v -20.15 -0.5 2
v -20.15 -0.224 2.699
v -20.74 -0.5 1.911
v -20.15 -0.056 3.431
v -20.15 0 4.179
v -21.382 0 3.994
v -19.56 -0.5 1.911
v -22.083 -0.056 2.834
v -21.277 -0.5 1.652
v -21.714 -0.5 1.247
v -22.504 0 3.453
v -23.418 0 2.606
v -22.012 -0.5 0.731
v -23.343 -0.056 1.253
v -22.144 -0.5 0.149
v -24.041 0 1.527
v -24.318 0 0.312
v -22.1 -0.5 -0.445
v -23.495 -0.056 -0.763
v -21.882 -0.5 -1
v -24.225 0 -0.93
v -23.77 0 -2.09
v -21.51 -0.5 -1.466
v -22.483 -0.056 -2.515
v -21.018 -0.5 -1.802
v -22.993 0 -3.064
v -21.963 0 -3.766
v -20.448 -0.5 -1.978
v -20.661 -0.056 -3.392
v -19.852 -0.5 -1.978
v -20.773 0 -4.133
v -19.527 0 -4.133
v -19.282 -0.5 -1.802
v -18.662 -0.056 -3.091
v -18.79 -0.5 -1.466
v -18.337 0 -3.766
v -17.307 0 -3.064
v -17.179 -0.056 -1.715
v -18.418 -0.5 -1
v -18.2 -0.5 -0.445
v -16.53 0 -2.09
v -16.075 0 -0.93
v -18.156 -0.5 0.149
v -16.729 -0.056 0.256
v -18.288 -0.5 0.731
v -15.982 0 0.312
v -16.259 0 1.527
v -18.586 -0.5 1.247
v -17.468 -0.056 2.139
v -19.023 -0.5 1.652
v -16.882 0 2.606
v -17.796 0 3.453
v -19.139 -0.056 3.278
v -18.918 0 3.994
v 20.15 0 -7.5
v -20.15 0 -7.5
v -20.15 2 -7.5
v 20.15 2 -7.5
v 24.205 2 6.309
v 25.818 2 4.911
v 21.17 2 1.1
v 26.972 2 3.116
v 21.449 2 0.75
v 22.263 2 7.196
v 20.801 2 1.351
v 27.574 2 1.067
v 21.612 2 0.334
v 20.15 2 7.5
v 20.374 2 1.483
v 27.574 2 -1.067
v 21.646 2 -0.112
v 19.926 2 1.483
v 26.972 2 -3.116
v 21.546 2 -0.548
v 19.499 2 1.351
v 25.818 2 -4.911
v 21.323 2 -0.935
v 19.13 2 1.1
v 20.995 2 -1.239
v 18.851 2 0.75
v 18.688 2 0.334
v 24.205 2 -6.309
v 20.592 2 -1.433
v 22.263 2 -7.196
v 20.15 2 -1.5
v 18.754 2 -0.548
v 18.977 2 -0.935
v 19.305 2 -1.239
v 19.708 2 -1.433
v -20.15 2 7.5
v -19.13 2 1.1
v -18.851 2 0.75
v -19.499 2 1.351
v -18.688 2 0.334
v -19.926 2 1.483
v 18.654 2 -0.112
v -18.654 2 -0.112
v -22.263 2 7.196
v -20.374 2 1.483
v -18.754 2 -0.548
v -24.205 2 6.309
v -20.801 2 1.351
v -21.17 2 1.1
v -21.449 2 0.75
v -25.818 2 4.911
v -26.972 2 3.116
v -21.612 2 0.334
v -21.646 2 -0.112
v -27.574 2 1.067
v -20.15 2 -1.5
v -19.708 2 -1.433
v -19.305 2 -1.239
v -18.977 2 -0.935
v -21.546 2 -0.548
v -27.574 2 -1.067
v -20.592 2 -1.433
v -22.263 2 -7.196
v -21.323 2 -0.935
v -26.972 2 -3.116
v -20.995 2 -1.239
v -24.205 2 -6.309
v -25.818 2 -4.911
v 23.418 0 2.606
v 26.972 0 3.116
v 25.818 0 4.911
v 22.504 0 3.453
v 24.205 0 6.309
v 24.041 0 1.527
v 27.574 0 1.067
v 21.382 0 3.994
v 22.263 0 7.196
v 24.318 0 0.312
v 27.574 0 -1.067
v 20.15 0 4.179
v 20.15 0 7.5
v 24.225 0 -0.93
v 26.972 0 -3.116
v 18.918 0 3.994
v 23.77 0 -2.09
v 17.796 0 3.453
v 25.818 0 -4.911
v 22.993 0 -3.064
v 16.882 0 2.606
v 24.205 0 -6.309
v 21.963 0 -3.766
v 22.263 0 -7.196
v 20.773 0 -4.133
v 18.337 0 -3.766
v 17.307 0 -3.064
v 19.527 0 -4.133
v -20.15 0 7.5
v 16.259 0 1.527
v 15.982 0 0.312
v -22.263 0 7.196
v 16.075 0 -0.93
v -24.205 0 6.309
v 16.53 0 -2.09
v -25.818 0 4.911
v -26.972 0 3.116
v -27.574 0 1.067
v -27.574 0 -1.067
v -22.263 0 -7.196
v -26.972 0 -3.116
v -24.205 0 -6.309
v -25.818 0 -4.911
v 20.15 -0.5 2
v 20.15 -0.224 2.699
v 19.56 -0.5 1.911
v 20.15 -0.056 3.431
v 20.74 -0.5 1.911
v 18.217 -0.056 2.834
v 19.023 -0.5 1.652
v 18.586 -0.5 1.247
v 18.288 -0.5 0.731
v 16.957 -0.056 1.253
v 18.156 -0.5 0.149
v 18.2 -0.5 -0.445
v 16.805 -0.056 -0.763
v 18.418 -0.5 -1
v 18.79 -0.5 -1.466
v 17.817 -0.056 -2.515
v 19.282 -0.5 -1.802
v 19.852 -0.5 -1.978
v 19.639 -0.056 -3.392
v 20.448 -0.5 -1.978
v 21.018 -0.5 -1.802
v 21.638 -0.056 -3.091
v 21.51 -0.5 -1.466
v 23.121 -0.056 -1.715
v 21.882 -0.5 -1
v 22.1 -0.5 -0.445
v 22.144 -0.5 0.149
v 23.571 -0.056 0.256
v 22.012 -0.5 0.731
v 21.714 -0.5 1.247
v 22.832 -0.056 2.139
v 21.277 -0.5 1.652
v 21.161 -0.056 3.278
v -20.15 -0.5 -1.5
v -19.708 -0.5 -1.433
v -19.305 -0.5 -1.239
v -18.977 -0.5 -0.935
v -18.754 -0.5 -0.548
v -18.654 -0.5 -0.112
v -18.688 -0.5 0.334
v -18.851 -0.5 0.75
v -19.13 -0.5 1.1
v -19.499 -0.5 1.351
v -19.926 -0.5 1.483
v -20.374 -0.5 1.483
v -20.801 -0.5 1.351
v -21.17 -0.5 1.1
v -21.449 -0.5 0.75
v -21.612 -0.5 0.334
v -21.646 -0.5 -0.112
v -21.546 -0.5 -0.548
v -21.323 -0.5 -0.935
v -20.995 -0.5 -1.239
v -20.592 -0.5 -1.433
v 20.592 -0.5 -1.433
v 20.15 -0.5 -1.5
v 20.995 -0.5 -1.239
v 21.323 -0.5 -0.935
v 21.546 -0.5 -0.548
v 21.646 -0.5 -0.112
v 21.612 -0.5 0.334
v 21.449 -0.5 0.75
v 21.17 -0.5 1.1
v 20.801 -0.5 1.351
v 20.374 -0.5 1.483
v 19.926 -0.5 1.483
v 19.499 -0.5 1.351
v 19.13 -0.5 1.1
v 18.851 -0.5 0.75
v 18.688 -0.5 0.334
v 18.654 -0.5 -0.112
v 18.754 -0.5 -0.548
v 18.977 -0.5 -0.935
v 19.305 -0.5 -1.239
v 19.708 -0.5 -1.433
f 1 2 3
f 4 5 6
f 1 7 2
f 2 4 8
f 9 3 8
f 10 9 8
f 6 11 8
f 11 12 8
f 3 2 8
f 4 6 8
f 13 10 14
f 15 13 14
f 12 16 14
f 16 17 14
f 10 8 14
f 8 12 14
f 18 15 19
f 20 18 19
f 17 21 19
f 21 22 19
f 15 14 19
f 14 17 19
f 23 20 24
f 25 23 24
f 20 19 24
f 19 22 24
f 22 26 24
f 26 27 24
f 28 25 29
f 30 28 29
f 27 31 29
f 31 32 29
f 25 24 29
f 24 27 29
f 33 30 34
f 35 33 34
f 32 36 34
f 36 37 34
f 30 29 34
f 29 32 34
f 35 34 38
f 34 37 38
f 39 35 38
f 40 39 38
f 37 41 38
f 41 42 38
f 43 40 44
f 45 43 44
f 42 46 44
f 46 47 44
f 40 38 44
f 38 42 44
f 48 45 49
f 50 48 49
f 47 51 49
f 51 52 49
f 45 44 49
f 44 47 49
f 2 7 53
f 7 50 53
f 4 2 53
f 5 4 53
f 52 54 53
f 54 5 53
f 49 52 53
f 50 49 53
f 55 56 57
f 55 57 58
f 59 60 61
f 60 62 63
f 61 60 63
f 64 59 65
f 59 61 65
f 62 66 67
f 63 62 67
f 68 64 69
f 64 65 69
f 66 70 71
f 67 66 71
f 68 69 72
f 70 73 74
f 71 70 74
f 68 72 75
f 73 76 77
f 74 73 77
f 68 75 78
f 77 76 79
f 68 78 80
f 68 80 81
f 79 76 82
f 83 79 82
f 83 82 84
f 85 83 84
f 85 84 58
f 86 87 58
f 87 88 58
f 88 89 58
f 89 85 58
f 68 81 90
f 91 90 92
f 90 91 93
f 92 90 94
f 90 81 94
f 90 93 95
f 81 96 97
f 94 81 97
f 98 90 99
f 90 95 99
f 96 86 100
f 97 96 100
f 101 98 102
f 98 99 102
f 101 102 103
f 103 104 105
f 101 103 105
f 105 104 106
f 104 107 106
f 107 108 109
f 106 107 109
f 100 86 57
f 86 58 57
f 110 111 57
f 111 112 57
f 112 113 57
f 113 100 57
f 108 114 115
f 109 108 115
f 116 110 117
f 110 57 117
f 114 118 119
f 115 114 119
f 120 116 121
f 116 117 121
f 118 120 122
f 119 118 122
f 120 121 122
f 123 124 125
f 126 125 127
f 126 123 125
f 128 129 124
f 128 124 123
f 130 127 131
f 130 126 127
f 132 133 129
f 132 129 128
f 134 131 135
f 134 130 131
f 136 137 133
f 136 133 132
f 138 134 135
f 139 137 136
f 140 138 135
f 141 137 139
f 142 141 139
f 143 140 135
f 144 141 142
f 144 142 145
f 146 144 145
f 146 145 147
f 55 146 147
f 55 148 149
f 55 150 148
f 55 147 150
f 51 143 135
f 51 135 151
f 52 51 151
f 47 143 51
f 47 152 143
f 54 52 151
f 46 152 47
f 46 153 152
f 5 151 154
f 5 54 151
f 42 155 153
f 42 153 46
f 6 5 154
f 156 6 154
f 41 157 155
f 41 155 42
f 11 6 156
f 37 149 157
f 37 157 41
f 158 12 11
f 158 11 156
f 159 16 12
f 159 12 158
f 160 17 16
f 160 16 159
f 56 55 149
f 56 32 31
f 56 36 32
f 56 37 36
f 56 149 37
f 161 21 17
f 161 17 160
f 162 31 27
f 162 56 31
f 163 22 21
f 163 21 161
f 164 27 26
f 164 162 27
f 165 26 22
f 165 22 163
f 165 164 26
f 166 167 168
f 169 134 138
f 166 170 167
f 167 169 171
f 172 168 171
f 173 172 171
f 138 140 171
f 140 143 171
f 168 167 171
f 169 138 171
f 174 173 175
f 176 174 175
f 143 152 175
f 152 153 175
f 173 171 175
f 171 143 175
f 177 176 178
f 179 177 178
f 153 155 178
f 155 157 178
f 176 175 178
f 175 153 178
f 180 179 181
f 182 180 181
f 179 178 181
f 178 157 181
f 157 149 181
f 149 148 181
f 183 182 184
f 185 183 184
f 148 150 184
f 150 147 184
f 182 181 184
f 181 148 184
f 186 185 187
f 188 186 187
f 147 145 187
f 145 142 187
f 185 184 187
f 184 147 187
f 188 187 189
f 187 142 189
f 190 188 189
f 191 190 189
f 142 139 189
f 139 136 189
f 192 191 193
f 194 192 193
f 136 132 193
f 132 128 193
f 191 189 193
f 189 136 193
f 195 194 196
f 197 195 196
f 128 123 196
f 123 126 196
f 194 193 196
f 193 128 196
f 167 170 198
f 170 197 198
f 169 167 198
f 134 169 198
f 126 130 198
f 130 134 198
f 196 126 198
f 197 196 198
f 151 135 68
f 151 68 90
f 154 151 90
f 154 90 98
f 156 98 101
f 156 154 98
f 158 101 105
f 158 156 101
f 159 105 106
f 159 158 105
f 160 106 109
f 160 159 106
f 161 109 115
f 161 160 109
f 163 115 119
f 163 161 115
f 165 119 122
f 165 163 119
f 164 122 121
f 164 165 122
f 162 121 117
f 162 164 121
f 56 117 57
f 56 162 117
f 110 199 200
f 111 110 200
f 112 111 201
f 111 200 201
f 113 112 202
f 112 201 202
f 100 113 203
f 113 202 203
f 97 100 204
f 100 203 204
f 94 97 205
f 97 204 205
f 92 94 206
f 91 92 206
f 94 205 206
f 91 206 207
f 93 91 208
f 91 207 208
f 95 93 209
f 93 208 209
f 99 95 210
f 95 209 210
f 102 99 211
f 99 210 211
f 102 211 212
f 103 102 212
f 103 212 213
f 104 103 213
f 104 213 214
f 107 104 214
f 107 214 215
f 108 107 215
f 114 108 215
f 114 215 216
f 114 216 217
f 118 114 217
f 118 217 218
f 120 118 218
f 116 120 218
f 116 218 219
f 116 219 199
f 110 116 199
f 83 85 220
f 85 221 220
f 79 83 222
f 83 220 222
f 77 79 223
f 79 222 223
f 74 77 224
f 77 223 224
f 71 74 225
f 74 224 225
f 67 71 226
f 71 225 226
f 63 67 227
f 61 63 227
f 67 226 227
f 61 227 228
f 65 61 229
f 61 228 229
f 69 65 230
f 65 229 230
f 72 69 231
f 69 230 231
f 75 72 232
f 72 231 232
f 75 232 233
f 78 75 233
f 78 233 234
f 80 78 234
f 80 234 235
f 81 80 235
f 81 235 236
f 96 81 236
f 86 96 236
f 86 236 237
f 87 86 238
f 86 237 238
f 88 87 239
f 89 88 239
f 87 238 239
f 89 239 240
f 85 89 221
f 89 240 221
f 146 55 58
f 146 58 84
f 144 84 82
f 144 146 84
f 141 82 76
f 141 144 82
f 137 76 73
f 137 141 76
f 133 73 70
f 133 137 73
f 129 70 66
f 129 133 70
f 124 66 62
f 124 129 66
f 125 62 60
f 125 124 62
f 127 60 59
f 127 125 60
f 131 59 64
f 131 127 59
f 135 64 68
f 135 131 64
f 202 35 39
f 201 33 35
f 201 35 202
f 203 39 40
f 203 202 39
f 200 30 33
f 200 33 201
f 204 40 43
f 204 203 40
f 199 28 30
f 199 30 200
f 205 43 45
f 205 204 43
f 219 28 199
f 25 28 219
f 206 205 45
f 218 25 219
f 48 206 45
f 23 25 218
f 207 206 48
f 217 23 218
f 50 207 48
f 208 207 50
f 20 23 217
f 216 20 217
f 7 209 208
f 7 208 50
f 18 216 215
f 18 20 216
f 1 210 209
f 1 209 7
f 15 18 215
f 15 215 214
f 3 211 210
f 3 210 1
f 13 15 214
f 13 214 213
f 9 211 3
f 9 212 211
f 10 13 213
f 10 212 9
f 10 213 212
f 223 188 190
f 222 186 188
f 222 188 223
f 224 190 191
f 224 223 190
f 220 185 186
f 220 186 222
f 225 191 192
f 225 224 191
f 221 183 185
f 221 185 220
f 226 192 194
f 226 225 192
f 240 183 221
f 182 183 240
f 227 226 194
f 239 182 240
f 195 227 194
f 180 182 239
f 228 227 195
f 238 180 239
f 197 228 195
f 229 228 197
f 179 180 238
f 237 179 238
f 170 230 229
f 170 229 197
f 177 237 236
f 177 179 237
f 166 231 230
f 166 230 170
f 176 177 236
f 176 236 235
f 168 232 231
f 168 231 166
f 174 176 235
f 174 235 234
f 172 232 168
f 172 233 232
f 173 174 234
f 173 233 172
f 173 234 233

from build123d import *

# Parameters (mm, degrees)
BOSS_EXTRUDE1_DEPTH = 2
SKETCH2_R           = 1.5
CUT_EXTRUDE1_DEPTH  = 29.718852693
BOSS_EXTRUDE2_START = 0.5
SKETCH3_R           = 2
SKETCH3_R_2         = 1.5
BOSS_EXTRUDE2_DEPTH = 0.5
FILLET1_R           = 5


with BuildPart() as part:
    # Sketch1 → Boss-Extrude1 (new body)
    with BuildSketch(Plane(origin=(0, 0, 0), x_dir=(1, 0, 0), z_dir=(0, 1, 0))):
        with BuildLine():
            Line((-20.15, 7.5), (20.15, 7.5))
            ThreePointArc((20.15, 7.5), (27.65, 0), (20.15, -7.5))
            Line((20.15, -7.5), (-20.15, -7.5))
            ThreePointArc((-20.15, -7.5), (-27.65, 0), (-20.15, 7.5))
        make_face()
    extrude(amount=BOSS_EXTRUDE1_DEPTH)

    # Sketch2 → Cut-Extrude1 (cut, through all)
    with BuildSketch(Plane.XZ):
        with Locations(Location((-20.15, 0, 0), (0, 0, 270))):
            Circle(SKETCH2_R)
        with Locations(Location((20.15, 0, 0), (0, 0, 270))):
            Circle(SKETCH2_R)
    extrude(amount=-CUT_EXTRUDE1_DEPTH, mode=Mode.SUBTRACT)

    # Sketch3 → Boss-Extrude2 (add)
    # profile 1 of 2: a face of its own
    with BuildSketch(Plane.XZ.offset(BOSS_EXTRUDE2_START)):
        with Locations(Location((-20.15, 0, 0), (0, 0, 90))):
            Circle(SKETCH3_R)
        with Locations(Location((-20.15, 0, 0), (0, 0, 270))):
            Circle(SKETCH3_R_2, mode=Mode.SUBTRACT)
    # profile 2 of 2: a face of its own
    with BuildSketch(Plane.XZ.offset(BOSS_EXTRUDE2_START)):
        with Locations(Location((20.15, 0, 0), (0, 0, 90))):
            Circle(SKETCH3_R)
        with Locations(Location((20.15, 0, 0), (0, 0, 270))):
            Circle(SKETCH3_R_2, mode=Mode.SUBTRACT)
    extrude(amount=-BOSS_EXTRUDE2_DEPTH)

    # Fillet1
    # the kernel refuses this fillet: 5 mm, written as the material it adds along each edge
    with BuildSketch(Plane(origin=(-20.15, 0, 0), x_dir=(0, 0, 1), z_dir=(1, 0, 0))) as fillet1_piece_1:
        with BuildLine():
            CenterArc((4.179449472, 5), FILLET1_R, 244.158067237, 25.841932763)
            Line((4.179449472, 0), (4.179449472, -0.1))
            Line((4.179449472, -0.1), (2, -0.1))
            Line((2, -0.1), (1.9, 0))
            ThreePointArc((1.9, 0), (1.9, 0.25), (1.956411011, 0.41))
            Line((1.956411011, 0.41), (2, 0.5))
        make_face()
    revolve(axis=Axis((-20.15, 0, 0), (0, -1, 0)))
    with BuildSketch(Plane(origin=(20.15, 0, 0), x_dir=(0, 0, 1), z_dir=(1, 0, 0))) as fillet1_piece_2:
        with BuildLine():
            CenterArc((4.179449472, 5), FILLET1_R, 244.158067237, 25.841932763)
            Line((4.179449472, 0), (4.179449472, -0.1))
            Line((4.179449472, -0.1), (2, -0.1))
            Line((2, -0.1), (1.9, 0))
            ThreePointArc((1.9, 0), (1.9, 0.25), (1.956411011, 0.41))
            Line((1.956411011, 0.41), (2, 0.5))
        make_face()
    revolve(axis=Axis((20.15, 0, 0), (0, -1, 0)))


solid = part.part
